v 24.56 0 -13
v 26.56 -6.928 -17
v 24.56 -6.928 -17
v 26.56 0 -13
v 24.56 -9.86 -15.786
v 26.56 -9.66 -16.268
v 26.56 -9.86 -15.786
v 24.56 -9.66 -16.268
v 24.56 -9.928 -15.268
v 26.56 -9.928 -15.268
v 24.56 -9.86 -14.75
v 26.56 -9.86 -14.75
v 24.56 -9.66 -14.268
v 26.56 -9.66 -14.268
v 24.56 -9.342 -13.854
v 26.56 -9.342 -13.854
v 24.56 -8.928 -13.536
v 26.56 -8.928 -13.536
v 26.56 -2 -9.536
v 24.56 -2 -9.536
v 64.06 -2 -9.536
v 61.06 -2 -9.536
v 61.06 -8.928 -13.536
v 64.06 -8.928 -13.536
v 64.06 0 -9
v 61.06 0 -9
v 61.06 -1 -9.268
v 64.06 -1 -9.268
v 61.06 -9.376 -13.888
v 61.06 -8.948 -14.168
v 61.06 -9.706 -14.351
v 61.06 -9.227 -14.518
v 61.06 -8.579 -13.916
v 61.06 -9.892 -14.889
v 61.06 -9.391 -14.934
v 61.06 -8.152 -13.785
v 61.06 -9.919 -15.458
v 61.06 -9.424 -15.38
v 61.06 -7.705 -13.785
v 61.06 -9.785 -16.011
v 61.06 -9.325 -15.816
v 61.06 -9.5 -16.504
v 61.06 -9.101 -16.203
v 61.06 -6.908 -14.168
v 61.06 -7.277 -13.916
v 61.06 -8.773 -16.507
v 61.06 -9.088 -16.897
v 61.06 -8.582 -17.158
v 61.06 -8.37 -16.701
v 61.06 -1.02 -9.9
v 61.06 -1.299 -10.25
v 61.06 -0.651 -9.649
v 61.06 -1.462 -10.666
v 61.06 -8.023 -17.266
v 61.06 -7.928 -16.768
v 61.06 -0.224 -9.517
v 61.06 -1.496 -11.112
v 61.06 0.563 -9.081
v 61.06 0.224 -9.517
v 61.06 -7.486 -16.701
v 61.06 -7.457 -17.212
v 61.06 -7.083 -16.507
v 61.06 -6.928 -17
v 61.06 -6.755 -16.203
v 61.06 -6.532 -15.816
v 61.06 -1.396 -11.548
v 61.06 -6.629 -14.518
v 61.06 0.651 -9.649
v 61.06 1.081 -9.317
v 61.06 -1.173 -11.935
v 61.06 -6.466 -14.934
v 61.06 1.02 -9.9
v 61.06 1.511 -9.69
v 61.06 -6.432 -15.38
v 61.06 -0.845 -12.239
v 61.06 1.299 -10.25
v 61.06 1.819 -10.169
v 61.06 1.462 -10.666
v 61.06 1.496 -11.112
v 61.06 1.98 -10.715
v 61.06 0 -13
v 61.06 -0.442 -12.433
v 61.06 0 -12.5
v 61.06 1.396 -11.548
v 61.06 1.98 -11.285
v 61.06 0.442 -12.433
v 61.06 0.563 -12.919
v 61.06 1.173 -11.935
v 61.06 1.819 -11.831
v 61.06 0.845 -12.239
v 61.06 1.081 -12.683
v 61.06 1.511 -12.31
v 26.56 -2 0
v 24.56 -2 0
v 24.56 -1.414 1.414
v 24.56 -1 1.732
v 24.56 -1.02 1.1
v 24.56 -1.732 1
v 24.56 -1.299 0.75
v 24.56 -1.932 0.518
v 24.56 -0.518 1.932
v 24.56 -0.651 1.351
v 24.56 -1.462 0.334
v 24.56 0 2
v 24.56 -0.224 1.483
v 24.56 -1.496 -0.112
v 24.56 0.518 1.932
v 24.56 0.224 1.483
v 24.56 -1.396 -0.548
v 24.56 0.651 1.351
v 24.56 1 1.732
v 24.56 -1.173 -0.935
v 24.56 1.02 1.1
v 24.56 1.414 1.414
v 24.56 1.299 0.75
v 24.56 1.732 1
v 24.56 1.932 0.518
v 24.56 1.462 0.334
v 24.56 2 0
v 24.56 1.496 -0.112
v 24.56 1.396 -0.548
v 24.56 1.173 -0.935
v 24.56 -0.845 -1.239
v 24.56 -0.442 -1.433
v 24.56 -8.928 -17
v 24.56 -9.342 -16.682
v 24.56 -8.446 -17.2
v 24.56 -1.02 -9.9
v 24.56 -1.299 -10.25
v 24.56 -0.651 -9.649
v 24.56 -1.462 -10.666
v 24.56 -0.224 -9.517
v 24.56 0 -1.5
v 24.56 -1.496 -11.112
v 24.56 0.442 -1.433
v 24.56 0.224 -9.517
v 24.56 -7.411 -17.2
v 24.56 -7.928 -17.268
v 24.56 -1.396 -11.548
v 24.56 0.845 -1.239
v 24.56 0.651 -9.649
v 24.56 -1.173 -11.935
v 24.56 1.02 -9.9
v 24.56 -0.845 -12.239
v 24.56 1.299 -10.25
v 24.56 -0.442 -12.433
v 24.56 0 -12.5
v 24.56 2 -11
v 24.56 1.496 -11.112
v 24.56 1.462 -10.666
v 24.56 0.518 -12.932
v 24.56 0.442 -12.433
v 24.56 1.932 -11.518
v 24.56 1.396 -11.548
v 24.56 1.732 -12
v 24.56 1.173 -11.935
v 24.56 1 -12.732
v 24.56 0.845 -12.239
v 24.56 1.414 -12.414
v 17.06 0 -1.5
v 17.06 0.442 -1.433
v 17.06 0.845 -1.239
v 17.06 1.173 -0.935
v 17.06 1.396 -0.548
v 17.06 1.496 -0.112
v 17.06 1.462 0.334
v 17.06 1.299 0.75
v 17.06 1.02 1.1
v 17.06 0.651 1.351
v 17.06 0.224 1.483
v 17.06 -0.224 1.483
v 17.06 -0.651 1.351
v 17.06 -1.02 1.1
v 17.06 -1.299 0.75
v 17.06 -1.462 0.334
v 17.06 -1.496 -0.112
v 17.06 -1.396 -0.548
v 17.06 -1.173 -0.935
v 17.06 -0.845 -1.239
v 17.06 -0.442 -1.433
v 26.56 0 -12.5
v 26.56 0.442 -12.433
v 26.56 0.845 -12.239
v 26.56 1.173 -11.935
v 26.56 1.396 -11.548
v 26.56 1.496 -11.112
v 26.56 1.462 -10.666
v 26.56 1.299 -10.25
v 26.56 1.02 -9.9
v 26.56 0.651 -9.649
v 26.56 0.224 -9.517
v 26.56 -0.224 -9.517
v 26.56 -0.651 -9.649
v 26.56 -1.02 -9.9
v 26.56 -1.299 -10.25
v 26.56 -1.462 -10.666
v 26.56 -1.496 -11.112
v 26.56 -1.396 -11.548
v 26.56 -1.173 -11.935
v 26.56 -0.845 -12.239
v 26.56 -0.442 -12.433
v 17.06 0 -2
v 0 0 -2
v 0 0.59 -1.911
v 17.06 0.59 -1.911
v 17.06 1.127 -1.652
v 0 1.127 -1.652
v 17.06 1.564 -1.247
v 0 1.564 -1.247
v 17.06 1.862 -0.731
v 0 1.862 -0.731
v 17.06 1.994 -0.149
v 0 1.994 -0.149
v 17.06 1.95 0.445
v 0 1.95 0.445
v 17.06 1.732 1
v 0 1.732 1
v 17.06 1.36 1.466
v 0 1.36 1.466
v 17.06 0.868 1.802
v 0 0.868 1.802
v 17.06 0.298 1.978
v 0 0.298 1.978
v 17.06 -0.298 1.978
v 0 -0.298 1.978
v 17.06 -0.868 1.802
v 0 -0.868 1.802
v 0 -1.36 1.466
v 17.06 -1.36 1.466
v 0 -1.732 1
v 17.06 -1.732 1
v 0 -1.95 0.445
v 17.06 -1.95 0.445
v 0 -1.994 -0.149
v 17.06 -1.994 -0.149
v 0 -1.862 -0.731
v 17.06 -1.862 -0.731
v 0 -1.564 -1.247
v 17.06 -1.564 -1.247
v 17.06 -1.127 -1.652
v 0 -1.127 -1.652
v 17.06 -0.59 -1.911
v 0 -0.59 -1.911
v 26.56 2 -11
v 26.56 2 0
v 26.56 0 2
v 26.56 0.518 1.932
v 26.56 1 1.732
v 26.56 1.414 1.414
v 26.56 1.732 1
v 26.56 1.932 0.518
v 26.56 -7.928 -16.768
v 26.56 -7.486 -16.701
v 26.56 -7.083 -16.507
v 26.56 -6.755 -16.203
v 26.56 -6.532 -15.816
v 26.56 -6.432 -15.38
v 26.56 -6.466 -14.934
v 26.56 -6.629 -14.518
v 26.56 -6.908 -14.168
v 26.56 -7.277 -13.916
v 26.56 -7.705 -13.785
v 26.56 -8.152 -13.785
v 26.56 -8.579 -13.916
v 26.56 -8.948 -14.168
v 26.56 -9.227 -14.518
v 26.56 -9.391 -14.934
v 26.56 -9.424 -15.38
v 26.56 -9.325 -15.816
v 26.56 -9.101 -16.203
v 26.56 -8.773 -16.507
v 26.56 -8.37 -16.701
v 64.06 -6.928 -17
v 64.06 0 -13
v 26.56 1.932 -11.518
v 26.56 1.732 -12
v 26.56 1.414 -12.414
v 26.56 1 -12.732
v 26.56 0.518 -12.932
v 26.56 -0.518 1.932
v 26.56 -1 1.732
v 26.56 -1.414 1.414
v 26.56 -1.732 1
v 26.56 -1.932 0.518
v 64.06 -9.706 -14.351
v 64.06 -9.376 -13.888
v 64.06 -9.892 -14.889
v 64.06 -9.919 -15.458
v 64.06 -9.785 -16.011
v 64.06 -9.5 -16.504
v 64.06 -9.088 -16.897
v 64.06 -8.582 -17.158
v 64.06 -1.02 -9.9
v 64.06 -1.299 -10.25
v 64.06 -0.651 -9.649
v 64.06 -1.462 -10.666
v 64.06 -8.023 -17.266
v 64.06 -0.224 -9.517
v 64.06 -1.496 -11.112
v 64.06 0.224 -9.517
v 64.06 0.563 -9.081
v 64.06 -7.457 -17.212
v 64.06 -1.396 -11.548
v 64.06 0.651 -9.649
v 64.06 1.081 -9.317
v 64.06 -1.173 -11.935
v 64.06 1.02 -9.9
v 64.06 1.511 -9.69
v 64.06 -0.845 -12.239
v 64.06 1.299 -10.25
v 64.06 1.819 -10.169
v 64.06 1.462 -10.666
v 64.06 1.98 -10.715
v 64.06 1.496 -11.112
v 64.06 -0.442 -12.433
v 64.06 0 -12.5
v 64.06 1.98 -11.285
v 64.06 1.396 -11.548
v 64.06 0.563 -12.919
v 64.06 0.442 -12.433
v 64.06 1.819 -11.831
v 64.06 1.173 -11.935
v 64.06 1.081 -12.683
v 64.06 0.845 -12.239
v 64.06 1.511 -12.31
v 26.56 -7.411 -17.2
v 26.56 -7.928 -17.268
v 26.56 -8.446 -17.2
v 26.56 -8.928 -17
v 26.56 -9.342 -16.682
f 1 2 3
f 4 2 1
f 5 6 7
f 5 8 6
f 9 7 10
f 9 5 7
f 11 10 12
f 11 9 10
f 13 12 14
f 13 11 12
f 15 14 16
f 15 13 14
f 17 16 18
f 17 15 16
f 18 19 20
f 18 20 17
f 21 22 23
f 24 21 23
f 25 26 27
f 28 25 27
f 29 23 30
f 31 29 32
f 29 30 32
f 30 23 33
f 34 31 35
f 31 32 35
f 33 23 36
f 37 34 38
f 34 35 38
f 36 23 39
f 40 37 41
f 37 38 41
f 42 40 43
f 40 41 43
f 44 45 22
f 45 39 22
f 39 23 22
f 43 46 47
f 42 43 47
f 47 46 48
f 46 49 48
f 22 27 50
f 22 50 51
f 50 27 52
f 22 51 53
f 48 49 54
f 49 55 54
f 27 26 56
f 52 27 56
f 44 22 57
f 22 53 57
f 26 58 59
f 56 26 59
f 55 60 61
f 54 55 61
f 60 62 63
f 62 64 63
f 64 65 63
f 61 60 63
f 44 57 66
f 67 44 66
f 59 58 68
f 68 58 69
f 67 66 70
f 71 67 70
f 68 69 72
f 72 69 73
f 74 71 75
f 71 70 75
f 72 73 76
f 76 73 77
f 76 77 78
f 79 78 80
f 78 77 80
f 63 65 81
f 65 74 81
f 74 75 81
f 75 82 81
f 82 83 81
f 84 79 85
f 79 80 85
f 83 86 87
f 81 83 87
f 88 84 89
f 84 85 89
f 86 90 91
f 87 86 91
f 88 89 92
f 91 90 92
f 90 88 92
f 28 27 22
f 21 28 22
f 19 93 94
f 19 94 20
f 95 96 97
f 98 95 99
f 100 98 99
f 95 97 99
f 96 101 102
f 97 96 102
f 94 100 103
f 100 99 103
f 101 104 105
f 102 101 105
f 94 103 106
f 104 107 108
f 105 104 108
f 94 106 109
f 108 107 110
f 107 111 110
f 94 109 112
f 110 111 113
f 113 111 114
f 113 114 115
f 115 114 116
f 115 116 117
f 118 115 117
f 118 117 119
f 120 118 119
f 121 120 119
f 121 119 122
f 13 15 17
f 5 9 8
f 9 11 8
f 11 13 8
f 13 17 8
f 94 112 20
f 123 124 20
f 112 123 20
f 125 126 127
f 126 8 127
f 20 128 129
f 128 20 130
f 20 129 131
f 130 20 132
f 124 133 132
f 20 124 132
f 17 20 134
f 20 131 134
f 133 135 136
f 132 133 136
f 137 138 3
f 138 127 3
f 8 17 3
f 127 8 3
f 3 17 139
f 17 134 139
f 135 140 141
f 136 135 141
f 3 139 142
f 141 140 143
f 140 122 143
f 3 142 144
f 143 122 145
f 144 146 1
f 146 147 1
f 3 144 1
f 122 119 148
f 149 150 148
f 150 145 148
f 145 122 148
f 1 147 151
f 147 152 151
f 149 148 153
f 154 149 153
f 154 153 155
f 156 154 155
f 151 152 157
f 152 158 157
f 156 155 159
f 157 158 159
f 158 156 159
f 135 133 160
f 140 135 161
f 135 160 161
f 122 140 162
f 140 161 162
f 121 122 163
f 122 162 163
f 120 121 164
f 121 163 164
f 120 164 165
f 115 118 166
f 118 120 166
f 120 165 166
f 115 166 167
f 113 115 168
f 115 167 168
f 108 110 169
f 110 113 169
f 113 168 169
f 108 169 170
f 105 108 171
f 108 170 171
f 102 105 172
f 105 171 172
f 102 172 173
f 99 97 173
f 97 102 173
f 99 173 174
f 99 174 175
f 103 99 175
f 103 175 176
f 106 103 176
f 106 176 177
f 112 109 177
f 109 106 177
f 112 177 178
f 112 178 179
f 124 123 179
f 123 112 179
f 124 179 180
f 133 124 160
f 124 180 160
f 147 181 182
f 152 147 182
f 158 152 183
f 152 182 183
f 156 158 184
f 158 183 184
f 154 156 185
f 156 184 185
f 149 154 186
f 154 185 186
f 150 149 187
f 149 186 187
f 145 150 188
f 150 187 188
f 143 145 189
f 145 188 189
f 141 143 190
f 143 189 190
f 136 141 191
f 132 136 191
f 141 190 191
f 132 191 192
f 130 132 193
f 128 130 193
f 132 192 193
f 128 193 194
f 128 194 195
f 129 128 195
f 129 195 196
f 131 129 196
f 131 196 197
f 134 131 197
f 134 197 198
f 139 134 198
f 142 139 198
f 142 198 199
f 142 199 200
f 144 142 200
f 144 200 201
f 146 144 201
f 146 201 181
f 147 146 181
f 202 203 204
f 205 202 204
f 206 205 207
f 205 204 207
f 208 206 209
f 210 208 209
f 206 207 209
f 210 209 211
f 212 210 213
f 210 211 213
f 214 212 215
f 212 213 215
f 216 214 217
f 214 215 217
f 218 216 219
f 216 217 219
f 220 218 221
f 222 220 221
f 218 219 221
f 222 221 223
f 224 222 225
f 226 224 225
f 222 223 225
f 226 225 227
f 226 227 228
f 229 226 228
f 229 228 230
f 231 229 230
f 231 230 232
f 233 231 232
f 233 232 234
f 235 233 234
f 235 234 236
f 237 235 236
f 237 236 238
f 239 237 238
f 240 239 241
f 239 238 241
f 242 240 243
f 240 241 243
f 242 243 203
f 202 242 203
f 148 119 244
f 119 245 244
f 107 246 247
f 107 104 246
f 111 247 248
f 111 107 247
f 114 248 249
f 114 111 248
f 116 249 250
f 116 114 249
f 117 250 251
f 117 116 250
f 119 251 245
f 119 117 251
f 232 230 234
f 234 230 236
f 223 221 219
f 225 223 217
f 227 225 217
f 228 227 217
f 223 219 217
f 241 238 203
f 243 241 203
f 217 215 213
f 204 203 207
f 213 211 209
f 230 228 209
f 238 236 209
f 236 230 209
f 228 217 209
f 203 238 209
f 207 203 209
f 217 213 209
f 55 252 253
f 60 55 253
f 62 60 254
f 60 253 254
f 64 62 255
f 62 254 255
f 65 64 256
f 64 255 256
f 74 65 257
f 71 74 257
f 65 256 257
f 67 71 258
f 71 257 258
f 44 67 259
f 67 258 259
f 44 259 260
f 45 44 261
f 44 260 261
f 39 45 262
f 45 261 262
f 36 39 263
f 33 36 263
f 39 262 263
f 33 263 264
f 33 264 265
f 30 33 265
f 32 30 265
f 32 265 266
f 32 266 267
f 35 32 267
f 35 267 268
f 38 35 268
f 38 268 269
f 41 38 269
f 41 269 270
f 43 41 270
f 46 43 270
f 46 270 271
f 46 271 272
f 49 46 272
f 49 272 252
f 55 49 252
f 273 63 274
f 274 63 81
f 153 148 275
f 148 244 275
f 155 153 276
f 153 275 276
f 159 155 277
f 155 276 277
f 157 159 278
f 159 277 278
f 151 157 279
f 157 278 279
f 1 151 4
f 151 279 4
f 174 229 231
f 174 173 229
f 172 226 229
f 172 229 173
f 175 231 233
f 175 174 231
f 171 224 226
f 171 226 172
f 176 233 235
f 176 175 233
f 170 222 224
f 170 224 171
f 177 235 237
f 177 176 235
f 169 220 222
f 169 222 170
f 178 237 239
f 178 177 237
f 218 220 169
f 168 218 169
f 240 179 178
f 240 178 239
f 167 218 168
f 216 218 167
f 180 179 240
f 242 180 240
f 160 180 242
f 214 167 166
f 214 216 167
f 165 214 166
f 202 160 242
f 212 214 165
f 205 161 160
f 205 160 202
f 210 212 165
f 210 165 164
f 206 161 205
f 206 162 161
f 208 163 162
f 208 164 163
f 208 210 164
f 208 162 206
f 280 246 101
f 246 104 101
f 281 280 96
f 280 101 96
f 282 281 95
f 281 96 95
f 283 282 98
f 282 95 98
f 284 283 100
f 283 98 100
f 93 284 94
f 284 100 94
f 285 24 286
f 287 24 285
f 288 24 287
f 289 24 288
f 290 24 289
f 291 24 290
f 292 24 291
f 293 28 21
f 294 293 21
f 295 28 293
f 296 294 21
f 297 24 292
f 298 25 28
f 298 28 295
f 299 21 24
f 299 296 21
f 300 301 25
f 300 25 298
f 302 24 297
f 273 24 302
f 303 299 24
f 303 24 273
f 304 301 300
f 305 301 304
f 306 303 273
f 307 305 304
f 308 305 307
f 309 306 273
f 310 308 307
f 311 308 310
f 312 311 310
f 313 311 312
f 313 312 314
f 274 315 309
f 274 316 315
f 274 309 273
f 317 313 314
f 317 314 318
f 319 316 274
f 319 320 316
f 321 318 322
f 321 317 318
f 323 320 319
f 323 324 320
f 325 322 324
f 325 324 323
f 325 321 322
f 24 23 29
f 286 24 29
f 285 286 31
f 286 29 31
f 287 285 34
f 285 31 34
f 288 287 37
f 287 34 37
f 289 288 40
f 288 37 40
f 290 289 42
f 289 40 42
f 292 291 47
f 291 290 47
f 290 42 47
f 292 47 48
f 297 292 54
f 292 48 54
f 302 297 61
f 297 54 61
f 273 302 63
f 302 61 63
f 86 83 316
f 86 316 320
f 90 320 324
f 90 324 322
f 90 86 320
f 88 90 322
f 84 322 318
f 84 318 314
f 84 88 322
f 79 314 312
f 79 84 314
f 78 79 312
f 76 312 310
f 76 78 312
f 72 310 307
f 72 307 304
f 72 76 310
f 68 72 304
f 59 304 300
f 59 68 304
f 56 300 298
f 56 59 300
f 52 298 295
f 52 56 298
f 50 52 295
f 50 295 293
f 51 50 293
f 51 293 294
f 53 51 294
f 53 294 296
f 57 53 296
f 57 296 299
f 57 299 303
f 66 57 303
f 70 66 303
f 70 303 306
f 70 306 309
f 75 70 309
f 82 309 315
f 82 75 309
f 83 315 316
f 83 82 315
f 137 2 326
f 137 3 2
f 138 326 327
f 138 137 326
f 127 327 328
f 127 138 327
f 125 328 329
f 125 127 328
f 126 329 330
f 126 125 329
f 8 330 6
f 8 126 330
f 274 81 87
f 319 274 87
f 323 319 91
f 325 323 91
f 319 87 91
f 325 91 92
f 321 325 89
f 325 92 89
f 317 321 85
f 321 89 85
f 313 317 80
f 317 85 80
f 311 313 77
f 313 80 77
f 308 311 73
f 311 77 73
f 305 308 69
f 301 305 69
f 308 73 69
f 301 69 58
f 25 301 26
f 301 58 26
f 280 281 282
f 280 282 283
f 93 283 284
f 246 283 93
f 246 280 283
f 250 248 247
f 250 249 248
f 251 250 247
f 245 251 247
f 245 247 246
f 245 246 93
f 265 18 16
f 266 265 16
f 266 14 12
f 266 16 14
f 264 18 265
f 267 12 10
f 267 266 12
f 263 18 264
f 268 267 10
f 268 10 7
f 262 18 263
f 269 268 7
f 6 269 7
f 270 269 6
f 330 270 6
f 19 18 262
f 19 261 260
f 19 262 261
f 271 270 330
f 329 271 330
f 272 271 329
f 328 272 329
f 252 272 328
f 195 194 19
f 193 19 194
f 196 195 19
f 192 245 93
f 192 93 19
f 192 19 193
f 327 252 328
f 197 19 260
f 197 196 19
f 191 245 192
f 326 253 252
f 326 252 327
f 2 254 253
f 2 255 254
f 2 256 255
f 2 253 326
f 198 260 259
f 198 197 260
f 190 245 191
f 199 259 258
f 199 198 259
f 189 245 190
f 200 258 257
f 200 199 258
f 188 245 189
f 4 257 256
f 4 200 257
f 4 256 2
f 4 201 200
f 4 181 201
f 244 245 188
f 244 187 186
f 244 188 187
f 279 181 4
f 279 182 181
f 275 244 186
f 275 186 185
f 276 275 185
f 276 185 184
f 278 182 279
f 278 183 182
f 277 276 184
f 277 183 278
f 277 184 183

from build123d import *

# Parameters (mm, degrees)
SKETCH2_R                = 2
BOSS_EXTRUDE1_DEPTH      = 17.06
SKETCH3_R                = 1.5
BOSS_EXTRUDE2_DEPTH      = 9.5
SKETCH4_W                = 3.988125856
SKETCH4_H                = 4
BOSS_EXTRUDE3_DEPTH      = 2
SKETCH5_W                = 2
SKETCH5_H                = 4
BOSS_EXTRUDE4_DEPTH      = 15
FILLET1_R                = 2
FILLET2_R                = 2
FILLET3_R                = 2
SKETCH6_R                = 1.5
CUT_EXTRUDE1_DEPTH       = 30.638380523
BOSS_EXTRUDE5_DEPTH      = 2
FILLET4_R                = 2
FILLET5_R                = 2
SKETCH8_R                = 1.5
BOSS_EXTRUDE6_DEPTH      = 36
BOSS_EXTRUDE7_DEPTH      = 1.5
BOSS_EXTRUDE7_DEPTH_BACK = 1.5
SKETCH9_R                = 2
SKETCH9_R_2              = 1.5


with BuildPart() as part:
    # Sketch2 → Boss-Extrude1 (new body)
    with BuildSketch(Plane(origin=(0, 0, 0), x_dir=(0, 0, -1), z_dir=(1, 0, 0))):
        Circle(SKETCH2_R)
    extrude(amount=BOSS_EXTRUDE1_DEPTH)

    # Sketch3 → Boss-Extrude2 (add)
    with BuildSketch(Plane(origin=(17.06, 0, 0), x_dir=(0, 0, -1), z_dir=(1, 0, 0))):
        Circle(SKETCH3_R)
    extrude(amount=BOSS_EXTRUDE2_DEPTH)

    # Sketch4 → Boss-Extrude3 (add)
    with BuildSketch(Plane(origin=(26.56, 0, 0), x_dir=(0, 0, -1), z_dir=(1, 0, 0))):
        with Locations((-0.005937072, 0)):
            Rectangle(SKETCH4_W, SKETCH4_H)
    extrude(amount=-BOSS_EXTRUDE3_DEPTH)

    # Sketch5 → Boss-Extrude4 (add)
    with BuildSketch(Plane.XY.offset(2)):
        with Locations((25.56, 0)):
            Rectangle(SKETCH5_W, SKETCH5_H)
    extrude(amount=-BOSS_EXTRUDE4_DEPTH)

    # Fillet1
    fillet1_edges = [part.edges().sort_by_distance(p)[0] for p in [
        (25.56, 2, 2),
    ]]
    fillet(fillet1_edges, radius=FILLET1_R)

    # Fillet2
    fillet2_edges = [part.edges().sort_by_distance(p)[0] for p in [
        (25.56, -2, 2),
    ]]
    fillet(fillet2_edges, radius=FILLET2_R - 0.0001)  # a hair under: the kernel refuses the full size

    # Fillet3
    fillet3_edges = [part.edges().sort_by_distance(p)[0] for p in [
        (25.56, -2, -13),
        (25.56, 2, -13),
    ]]
    fillet(fillet3_edges, radius=FILLET3_R - 0.0001)  # a hair under: the kernel refuses the full size

    # Sketch6 → Cut-Extrude1 (cut, through all)
    with BuildSketch(Plane(origin=(26.56, 0, 0), x_dir=(0, 0, -1), z_dir=(1, 0, 0))):
        with Locations((11, 0)):
            Circle(SKETCH6_R)
    extrude(amount=-CUT_EXTRUDE1_DEPTH, mode=Mode.SUBTRACT)

    # Sketch7 → Boss-Extrude5 (add)
    with BuildSketch(Plane(origin=(26.56, 0, 0), x_dir=(0, 0, -1), z_dir=(1, 0, 0))):
        with BuildLine():
            Line((18, -8.660254038), (13, 0))
            ThreePointArc((13, 0), (12.414213562, -1.414213562), (11, -2))
            Line((11, -2), (9.535898385, -2))
            Line((9.535898385, -2), (14.535898385, -10.660254038))
            Line((14.535898385, -10.660254038), (18, -8.660254038))
        make_face()
    extrude(amount=-BOSS_EXTRUDE5_DEPTH)

    # Fillet4
    fillet4_edges = [part.edges().sort_by_distance(p)[0] for p in [
        (25.56, -8.660254038, -18),
    ]]
    fillet(fillet4_edges, radius=FILLET4_R)

    # Fillet5
    fillet5_edges = [part.edges().sort_by_distance(p)[0] for p in [
        (25.56, -10.660254038, -14.535898385),
    ]]
    fillet(fillet5_edges, radius=FILLET5_R - 0.0001)  # a hair under: the kernel refuses the full size

    # Sketch8 → Boss-Extrude6 (add)
    with BuildSketch(Plane(origin=(26.56, 0, 0), x_dir=(0, 0, -1), z_dir=(1, 0, 0))):
        with Locations((15.267949192, -7.92820323)):
            Circle(SKETCH8_R)
    extrude(amount=BOSS_EXTRUDE6_DEPTH)

    # Sketch9 → Boss-Extrude7 (add, two sides: drawn at the far end of the back side and taken through both)
    # profile 1 of 4: a face of its own
    with BuildSketch(Plane(origin=(62.56, 0, 0), x_dir=(0, 0, -1), z_dir=(1, 0, 0)).offset(-BOSS_EXTRUDE7_DEPTH_BACK)):
        with Locations((15.267949192, -7.92820323)):
            Circle(SKETCH9_R)
        with Locations((15.267949192, -7.92820323)):
            Circle(SKETCH9_R_2, mode=Mode.SUBTRACT)
    # profile 2 of 4: a face of its own
    with BuildSketch(Plane(origin=(62.56, 0, 0), x_dir=(0, 0, -1), z_dir=(1, 0, 0)).offset(-BOSS_EXTRUDE7_DEPTH_BACK)):
        with BuildLine():
            ThreePointArc((13.535898385, -8.92820323), (14.267949192, -6.196152423), (17, -6.92820323))
            Line((17, -6.92820323), (13, 0))
            ThreePointArc((13, 0), (11.51763809, -1.931851653), (9.267949192, -1))
            Line((9.267949192, -1), (9.535898385, -2))
            Line((9.535898385, -2), (13.535898385, -8.92820323))
        make_face()
    # profile 3 of 4: a face of its own
    with BuildSketch(Plane(origin=(62.56, 0, 0), x_dir=(0, 0, -1), z_dir=(1, 0, 0)).offset(-BOSS_EXTRUDE7_DEPTH_BACK)):
        with BuildLine():
            ThreePointArc((9.267949192, -1), (11.51763809, -1.931851653), (13, 0))
            ThreePointArc((13, 0), (11, 2), (9, 0))
            Line((9, 0), (9.267949192, -1))
        make_face()
        with Locations((11, 0)):
            Circle(SKETCH9_R_2, mode=Mode.SUBTRACT)
    # profile 4 of 4: a face of its own
    with BuildSketch(Plane(origin=(62.56, 0, 0), x_dir=(0, 0, -1), z_dir=(1, 0, 0)).offset(-BOSS_EXTRUDE7_DEPTH_BACK)):
        with Locations((15.267949192, -7.92820323)):
            Circle(SKETCH9_R_2)
    extrude(amount=BOSS_EXTRUDE7_DEPTH + BOSS_EXTRUDE7_DEPTH_BACK)


solid = part.part
